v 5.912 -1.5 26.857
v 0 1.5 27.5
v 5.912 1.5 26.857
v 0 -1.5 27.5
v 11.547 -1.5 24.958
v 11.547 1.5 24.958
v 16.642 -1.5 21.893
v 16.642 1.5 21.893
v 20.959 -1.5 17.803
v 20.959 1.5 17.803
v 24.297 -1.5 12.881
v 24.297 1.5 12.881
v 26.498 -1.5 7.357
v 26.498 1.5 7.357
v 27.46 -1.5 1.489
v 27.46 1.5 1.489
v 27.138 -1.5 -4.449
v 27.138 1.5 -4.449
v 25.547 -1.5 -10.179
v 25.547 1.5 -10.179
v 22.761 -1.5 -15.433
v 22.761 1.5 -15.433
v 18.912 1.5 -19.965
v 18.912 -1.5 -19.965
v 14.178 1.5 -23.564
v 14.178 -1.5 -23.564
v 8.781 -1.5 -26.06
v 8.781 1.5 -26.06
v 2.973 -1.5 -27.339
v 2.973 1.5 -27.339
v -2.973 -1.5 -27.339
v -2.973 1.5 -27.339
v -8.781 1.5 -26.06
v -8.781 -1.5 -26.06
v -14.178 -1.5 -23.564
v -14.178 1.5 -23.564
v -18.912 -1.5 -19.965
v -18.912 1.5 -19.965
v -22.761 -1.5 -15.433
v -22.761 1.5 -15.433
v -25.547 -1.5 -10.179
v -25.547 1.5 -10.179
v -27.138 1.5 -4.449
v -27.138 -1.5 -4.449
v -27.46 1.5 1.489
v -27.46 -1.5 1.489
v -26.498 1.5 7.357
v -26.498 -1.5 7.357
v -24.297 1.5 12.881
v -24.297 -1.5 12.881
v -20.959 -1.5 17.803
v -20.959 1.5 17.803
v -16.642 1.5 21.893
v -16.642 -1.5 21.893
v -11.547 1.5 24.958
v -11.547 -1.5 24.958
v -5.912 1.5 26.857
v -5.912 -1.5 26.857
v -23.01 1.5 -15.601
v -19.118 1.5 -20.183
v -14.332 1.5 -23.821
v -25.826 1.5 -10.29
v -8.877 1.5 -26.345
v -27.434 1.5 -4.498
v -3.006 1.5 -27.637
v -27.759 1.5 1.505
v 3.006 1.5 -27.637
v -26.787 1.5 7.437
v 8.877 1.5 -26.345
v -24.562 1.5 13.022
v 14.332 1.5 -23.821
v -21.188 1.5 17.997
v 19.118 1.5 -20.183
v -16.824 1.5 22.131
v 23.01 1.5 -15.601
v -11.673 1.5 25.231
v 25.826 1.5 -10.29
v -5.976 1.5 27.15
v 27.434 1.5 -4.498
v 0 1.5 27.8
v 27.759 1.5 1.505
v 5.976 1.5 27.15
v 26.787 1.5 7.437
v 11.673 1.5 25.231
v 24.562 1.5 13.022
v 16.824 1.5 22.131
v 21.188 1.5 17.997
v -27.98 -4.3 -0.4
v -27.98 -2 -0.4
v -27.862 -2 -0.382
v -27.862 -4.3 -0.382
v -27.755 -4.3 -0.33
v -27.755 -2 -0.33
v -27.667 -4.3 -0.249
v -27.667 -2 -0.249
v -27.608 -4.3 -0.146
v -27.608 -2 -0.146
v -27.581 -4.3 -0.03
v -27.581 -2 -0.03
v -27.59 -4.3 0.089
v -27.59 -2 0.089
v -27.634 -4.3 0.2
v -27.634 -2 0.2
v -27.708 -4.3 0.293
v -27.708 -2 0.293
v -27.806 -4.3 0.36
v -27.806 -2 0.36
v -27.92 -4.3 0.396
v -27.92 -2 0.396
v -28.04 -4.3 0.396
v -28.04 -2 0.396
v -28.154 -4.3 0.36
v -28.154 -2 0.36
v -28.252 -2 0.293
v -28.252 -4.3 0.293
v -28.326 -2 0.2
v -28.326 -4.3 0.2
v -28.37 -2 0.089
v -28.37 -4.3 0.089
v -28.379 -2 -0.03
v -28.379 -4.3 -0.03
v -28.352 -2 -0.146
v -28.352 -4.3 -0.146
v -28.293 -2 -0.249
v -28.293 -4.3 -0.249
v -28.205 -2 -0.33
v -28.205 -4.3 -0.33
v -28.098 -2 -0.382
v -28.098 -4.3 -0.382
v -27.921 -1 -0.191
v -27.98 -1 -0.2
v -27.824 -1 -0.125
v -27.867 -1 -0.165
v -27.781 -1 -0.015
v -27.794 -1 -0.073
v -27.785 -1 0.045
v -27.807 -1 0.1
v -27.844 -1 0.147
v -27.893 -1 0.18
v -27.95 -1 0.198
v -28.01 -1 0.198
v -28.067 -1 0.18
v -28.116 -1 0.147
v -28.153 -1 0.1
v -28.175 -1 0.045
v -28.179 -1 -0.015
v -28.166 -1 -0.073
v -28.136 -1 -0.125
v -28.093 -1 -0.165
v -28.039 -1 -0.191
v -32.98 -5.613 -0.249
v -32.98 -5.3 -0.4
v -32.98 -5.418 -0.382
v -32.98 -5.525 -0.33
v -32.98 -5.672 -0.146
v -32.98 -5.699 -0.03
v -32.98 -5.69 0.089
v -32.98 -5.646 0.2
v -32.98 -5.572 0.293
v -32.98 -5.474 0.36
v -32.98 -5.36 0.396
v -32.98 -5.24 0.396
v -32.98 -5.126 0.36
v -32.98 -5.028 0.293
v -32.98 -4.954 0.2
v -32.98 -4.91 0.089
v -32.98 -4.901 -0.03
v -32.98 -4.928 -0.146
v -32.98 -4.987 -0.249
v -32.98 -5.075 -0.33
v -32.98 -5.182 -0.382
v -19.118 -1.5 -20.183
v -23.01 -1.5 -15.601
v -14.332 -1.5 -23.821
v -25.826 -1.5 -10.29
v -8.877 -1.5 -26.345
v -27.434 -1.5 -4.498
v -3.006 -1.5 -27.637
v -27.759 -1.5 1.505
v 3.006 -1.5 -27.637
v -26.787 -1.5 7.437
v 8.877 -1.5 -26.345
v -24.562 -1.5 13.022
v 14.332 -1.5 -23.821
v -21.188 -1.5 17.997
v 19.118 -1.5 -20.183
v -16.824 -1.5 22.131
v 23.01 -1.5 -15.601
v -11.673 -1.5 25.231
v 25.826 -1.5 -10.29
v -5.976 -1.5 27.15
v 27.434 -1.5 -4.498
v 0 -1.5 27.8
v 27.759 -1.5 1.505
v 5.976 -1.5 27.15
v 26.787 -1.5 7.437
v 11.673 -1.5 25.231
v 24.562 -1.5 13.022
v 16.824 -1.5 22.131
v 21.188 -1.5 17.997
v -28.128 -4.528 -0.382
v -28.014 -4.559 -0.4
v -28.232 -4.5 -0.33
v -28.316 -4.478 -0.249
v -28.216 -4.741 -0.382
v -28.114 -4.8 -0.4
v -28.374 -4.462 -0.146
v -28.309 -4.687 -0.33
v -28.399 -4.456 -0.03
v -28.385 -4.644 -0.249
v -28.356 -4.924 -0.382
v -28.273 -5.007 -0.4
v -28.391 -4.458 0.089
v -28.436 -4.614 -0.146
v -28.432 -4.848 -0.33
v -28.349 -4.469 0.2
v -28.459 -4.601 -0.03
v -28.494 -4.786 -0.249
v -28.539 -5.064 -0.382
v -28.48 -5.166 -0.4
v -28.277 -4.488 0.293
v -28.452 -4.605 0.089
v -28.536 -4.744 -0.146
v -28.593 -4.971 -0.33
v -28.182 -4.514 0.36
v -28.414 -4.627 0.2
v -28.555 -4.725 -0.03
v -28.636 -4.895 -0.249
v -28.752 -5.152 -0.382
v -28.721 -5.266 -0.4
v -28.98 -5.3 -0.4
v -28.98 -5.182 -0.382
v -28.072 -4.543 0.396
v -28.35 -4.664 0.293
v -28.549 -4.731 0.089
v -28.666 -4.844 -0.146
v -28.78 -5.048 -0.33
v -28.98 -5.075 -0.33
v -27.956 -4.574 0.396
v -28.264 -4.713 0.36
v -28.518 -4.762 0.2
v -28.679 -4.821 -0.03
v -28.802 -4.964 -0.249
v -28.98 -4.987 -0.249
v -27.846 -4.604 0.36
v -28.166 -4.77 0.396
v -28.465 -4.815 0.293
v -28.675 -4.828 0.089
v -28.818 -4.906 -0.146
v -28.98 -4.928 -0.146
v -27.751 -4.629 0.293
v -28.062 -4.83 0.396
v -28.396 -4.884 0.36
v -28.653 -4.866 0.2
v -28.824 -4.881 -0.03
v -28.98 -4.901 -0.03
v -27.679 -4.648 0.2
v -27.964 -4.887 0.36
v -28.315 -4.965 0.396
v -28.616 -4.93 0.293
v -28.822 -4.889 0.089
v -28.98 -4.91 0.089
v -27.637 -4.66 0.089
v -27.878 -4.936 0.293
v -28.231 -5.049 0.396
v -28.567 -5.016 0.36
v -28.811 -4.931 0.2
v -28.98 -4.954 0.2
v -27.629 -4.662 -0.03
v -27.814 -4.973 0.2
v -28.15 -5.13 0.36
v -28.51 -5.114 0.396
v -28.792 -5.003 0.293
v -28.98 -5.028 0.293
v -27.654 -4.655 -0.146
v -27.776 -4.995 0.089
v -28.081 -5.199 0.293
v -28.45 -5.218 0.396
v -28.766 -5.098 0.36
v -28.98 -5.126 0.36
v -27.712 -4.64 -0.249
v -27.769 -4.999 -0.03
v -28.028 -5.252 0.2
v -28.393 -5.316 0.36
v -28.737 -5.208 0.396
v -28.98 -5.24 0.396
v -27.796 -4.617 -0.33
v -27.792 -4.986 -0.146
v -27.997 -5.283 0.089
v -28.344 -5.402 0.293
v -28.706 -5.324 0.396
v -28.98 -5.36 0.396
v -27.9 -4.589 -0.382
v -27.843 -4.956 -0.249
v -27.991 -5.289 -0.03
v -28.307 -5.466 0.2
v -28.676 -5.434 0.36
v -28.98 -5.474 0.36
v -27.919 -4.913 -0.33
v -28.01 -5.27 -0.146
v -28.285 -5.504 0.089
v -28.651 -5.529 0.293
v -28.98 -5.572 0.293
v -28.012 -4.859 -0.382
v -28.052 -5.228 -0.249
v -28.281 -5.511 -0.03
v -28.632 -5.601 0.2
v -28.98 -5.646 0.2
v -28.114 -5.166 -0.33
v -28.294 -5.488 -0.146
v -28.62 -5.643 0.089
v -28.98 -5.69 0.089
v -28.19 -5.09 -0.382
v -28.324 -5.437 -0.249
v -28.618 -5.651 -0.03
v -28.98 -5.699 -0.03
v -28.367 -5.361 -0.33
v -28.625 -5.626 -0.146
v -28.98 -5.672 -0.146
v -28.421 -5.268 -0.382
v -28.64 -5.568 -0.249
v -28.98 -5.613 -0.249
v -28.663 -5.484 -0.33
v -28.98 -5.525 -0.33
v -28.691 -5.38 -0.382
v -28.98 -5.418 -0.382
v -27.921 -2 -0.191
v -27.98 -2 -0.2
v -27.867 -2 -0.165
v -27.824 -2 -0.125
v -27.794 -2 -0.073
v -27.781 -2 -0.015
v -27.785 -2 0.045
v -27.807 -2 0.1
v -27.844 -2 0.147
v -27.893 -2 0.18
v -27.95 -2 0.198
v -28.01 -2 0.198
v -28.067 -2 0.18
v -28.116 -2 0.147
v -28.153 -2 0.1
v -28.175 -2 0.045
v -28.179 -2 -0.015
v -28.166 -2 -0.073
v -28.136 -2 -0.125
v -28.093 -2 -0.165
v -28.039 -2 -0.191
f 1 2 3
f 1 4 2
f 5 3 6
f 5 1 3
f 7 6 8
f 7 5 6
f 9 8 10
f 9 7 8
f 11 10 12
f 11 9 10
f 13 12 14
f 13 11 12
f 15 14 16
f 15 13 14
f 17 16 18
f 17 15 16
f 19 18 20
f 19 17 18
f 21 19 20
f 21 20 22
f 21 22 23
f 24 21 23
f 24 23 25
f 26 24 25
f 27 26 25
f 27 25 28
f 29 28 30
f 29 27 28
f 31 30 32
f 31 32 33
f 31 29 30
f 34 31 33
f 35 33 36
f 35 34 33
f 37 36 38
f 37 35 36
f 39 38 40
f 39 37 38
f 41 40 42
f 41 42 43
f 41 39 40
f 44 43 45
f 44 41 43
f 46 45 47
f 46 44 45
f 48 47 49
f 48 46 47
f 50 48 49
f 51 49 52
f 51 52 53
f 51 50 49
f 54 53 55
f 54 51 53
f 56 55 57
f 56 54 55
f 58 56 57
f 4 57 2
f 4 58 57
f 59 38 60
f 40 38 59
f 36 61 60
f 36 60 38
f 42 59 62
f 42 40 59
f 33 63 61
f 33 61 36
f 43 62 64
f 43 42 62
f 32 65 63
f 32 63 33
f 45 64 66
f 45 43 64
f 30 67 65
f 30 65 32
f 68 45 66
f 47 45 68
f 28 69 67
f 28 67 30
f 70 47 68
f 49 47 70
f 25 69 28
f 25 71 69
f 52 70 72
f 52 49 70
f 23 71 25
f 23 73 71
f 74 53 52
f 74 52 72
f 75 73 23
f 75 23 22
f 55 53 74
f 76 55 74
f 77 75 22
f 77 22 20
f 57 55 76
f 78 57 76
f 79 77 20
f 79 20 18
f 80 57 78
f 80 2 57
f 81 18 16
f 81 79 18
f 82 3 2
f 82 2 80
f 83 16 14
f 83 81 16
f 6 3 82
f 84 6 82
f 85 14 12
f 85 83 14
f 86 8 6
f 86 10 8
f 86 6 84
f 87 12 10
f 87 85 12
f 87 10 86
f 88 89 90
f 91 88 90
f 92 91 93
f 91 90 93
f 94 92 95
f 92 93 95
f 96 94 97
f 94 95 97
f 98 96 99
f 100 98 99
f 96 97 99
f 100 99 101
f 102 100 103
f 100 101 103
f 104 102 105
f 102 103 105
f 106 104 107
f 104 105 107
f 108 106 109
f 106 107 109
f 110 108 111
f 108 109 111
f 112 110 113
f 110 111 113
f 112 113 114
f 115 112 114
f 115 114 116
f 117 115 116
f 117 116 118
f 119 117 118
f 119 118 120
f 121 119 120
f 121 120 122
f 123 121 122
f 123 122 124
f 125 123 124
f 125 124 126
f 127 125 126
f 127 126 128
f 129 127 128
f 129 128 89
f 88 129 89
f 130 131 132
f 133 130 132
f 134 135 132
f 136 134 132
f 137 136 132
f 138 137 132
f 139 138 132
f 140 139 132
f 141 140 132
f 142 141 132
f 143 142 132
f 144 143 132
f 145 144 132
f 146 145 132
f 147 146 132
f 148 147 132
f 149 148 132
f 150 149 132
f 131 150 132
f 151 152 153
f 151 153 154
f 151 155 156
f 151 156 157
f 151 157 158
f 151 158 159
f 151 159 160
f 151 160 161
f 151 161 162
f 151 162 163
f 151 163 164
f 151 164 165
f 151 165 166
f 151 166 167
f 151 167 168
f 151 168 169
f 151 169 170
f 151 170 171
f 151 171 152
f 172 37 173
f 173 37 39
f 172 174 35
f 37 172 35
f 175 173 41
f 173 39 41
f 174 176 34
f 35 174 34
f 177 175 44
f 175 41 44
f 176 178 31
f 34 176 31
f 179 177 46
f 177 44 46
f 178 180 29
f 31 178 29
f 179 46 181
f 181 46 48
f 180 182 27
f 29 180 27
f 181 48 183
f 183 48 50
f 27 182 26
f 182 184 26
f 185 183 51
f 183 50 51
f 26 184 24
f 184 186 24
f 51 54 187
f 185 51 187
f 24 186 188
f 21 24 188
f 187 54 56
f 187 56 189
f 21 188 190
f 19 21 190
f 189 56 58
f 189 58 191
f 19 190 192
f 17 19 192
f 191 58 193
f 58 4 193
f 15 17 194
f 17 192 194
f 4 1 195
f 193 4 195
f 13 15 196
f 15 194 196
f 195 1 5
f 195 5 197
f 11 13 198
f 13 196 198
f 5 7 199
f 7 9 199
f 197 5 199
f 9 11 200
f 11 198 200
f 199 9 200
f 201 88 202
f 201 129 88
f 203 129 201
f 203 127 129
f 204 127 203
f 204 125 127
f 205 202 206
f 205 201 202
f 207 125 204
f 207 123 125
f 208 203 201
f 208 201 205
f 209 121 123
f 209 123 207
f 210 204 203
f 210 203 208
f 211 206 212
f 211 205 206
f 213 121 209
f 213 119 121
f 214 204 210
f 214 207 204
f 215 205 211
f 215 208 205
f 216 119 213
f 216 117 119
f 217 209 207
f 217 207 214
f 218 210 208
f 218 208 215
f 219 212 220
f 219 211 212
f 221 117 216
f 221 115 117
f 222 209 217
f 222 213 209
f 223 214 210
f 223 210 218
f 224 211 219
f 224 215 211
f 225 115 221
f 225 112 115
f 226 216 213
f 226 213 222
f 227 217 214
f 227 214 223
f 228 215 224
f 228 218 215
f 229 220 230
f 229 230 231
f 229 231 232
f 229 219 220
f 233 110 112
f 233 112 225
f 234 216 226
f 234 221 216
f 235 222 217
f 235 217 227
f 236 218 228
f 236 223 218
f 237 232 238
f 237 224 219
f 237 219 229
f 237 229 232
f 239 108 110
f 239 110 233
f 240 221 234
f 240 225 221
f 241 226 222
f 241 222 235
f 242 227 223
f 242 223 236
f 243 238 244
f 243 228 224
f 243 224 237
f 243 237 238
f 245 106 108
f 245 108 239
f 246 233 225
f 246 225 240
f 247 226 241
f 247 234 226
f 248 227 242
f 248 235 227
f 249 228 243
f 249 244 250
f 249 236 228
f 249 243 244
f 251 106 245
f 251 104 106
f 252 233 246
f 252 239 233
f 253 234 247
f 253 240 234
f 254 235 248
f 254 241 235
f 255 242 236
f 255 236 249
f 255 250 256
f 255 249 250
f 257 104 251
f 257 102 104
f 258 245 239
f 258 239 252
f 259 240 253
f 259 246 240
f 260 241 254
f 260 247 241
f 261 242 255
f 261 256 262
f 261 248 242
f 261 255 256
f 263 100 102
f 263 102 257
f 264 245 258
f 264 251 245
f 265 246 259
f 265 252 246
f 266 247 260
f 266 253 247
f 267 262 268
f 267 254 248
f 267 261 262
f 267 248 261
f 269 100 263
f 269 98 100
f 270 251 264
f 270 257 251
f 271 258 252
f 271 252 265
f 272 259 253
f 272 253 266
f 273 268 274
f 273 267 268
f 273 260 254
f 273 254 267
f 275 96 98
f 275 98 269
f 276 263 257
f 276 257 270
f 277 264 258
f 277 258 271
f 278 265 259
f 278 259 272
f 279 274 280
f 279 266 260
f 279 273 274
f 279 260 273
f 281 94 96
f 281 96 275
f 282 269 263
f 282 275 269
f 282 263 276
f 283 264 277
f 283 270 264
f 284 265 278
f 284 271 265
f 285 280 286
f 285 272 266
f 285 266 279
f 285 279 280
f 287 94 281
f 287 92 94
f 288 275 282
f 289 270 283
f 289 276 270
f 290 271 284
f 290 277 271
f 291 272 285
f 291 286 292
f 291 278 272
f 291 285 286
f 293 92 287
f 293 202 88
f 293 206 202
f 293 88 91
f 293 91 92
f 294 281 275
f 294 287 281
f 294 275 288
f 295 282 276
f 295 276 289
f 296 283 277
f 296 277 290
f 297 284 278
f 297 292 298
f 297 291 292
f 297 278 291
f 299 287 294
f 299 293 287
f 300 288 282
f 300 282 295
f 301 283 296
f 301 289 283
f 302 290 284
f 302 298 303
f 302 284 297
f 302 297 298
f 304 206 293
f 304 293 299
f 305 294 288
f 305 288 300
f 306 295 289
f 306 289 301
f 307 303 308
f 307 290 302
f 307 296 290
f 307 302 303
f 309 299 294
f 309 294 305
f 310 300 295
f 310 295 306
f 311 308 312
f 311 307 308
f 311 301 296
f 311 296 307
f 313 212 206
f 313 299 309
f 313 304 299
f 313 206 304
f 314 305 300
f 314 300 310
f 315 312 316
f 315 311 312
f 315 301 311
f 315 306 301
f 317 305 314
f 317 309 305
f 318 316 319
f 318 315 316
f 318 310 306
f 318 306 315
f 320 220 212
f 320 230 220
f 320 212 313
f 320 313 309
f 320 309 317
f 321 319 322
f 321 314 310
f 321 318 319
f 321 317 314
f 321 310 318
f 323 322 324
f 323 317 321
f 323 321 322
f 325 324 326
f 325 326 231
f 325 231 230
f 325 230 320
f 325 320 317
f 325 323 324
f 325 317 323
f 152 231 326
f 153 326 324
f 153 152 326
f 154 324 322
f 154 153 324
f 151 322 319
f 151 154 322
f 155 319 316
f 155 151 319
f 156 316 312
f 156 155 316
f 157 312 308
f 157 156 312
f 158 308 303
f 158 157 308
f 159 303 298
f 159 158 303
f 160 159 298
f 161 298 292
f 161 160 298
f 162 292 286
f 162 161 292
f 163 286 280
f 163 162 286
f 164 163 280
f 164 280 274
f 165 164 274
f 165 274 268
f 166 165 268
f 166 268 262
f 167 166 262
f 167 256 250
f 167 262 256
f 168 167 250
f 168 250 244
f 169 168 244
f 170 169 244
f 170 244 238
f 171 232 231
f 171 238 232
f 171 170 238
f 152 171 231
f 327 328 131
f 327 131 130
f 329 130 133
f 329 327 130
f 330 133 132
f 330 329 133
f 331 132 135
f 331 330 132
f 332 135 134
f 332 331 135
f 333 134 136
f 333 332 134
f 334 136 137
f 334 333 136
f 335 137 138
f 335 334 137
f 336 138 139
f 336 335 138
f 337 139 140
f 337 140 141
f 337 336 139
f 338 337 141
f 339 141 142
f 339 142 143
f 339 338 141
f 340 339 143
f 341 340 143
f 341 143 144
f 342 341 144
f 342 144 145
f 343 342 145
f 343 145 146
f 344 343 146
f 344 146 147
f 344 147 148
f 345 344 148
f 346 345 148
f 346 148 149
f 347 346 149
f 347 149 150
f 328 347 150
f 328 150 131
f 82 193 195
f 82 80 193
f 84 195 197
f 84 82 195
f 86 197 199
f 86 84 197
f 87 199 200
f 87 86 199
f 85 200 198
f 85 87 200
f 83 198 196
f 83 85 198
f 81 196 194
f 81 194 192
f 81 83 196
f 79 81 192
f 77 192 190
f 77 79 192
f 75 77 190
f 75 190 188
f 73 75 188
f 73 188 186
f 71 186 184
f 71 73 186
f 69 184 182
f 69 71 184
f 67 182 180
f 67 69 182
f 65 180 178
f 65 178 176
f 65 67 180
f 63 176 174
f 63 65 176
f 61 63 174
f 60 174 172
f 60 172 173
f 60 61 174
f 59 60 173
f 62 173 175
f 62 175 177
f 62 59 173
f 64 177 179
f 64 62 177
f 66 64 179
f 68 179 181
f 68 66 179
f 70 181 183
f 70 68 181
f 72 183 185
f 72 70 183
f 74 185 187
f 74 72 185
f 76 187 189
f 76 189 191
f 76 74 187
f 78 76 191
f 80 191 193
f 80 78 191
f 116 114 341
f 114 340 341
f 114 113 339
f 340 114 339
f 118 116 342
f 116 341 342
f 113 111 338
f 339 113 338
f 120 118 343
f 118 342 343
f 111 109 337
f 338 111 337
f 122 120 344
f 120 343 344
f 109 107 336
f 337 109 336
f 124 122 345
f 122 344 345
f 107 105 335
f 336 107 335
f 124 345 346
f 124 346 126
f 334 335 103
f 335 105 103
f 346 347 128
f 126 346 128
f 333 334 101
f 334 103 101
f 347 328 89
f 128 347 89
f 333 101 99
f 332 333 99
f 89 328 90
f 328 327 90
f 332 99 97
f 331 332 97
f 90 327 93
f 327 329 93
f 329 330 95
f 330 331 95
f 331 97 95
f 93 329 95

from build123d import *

# Parameters (mm, degrees)
SKETCH1_R           = 27.8
SKETCH1_R_2         = 27.5
BOSS_EXTRUDE1_DEPTH = 1.5
SWEEP1_PROFILE_R    = 0.2
SKETCH33_R          = 0.4
BOSS_EXTRUDE2_DEPTH = 1
SWEEP2_PROFILE_R    = 0.4


with BuildPart() as part:
    # Sketch1 → Boss-Extrude1 (new, symmetric)
    with BuildSketch(Plane(origin=(0, 0, 0), x_dir=(1, 0, 0), z_dir=(0, 1, 0))):
        with Locations(Location((0, 0, 0), (0, 0, 270))):
            Circle(SKETCH1_R)
        with Locations(Location((0, 0, 0), (0, 0, 270))):
            Circle(SKETCH1_R_2, mode=Mode.SUBTRACT)
    extrude(amount=BOSS_EXTRUDE1_DEPTH, both=True)


with BuildPart() as body_2:
    # Sweep1: sweep along a path in Sketch2
    with BuildLine(Plane.XY) as sweep1_path:
        Line((-27.98, -1), (-27.98, -2))
    # Sweep1 profile (on start of the path) → Sweep1 (sweep)
    with BuildSketch(Plane(origin=(-27.98, -1, 0), x_dir=(0, 0, -1), z_dir=(0, -1, 0))):
        Circle(SWEEP1_PROFILE_R)
    sweep(path=sweep1_path.line)

    # Sketch33 → Boss-Extrude2 (add)
    with BuildSketch(Plane.XZ.offset(2)):
        with Locations(Location((-27.98, 0, 0), (0, 0, 270))):
            Circle(SKETCH33_R)
    extrude(amount=BOSS_EXTRUDE2_DEPTH)

    # Sweep2: sweep along a path in Sketch34
    with BuildLine(Plane.XY) as sweep2_path:
        Line((-27.98, -2), (-27.98, -4.3))
        ThreePointArc((-27.98, -4.3), (-28.272893219, -5.007106781), (-28.98, -5.3))
        Line((-28.98, -5.3), (-32.98, -5.3))
    # Sweep2 profile (on start of the path) → Sweep2 (sweep)
    with BuildSketch(Plane(origin=(-27.98, -2, 0), x_dir=(0, 0, -1), z_dir=(0, -1, 0))):
        Circle(SWEEP2_PROFILE_R)
    sweep(path=sweep2_path.line)


solid = Compound([part.part, body_2.part])
